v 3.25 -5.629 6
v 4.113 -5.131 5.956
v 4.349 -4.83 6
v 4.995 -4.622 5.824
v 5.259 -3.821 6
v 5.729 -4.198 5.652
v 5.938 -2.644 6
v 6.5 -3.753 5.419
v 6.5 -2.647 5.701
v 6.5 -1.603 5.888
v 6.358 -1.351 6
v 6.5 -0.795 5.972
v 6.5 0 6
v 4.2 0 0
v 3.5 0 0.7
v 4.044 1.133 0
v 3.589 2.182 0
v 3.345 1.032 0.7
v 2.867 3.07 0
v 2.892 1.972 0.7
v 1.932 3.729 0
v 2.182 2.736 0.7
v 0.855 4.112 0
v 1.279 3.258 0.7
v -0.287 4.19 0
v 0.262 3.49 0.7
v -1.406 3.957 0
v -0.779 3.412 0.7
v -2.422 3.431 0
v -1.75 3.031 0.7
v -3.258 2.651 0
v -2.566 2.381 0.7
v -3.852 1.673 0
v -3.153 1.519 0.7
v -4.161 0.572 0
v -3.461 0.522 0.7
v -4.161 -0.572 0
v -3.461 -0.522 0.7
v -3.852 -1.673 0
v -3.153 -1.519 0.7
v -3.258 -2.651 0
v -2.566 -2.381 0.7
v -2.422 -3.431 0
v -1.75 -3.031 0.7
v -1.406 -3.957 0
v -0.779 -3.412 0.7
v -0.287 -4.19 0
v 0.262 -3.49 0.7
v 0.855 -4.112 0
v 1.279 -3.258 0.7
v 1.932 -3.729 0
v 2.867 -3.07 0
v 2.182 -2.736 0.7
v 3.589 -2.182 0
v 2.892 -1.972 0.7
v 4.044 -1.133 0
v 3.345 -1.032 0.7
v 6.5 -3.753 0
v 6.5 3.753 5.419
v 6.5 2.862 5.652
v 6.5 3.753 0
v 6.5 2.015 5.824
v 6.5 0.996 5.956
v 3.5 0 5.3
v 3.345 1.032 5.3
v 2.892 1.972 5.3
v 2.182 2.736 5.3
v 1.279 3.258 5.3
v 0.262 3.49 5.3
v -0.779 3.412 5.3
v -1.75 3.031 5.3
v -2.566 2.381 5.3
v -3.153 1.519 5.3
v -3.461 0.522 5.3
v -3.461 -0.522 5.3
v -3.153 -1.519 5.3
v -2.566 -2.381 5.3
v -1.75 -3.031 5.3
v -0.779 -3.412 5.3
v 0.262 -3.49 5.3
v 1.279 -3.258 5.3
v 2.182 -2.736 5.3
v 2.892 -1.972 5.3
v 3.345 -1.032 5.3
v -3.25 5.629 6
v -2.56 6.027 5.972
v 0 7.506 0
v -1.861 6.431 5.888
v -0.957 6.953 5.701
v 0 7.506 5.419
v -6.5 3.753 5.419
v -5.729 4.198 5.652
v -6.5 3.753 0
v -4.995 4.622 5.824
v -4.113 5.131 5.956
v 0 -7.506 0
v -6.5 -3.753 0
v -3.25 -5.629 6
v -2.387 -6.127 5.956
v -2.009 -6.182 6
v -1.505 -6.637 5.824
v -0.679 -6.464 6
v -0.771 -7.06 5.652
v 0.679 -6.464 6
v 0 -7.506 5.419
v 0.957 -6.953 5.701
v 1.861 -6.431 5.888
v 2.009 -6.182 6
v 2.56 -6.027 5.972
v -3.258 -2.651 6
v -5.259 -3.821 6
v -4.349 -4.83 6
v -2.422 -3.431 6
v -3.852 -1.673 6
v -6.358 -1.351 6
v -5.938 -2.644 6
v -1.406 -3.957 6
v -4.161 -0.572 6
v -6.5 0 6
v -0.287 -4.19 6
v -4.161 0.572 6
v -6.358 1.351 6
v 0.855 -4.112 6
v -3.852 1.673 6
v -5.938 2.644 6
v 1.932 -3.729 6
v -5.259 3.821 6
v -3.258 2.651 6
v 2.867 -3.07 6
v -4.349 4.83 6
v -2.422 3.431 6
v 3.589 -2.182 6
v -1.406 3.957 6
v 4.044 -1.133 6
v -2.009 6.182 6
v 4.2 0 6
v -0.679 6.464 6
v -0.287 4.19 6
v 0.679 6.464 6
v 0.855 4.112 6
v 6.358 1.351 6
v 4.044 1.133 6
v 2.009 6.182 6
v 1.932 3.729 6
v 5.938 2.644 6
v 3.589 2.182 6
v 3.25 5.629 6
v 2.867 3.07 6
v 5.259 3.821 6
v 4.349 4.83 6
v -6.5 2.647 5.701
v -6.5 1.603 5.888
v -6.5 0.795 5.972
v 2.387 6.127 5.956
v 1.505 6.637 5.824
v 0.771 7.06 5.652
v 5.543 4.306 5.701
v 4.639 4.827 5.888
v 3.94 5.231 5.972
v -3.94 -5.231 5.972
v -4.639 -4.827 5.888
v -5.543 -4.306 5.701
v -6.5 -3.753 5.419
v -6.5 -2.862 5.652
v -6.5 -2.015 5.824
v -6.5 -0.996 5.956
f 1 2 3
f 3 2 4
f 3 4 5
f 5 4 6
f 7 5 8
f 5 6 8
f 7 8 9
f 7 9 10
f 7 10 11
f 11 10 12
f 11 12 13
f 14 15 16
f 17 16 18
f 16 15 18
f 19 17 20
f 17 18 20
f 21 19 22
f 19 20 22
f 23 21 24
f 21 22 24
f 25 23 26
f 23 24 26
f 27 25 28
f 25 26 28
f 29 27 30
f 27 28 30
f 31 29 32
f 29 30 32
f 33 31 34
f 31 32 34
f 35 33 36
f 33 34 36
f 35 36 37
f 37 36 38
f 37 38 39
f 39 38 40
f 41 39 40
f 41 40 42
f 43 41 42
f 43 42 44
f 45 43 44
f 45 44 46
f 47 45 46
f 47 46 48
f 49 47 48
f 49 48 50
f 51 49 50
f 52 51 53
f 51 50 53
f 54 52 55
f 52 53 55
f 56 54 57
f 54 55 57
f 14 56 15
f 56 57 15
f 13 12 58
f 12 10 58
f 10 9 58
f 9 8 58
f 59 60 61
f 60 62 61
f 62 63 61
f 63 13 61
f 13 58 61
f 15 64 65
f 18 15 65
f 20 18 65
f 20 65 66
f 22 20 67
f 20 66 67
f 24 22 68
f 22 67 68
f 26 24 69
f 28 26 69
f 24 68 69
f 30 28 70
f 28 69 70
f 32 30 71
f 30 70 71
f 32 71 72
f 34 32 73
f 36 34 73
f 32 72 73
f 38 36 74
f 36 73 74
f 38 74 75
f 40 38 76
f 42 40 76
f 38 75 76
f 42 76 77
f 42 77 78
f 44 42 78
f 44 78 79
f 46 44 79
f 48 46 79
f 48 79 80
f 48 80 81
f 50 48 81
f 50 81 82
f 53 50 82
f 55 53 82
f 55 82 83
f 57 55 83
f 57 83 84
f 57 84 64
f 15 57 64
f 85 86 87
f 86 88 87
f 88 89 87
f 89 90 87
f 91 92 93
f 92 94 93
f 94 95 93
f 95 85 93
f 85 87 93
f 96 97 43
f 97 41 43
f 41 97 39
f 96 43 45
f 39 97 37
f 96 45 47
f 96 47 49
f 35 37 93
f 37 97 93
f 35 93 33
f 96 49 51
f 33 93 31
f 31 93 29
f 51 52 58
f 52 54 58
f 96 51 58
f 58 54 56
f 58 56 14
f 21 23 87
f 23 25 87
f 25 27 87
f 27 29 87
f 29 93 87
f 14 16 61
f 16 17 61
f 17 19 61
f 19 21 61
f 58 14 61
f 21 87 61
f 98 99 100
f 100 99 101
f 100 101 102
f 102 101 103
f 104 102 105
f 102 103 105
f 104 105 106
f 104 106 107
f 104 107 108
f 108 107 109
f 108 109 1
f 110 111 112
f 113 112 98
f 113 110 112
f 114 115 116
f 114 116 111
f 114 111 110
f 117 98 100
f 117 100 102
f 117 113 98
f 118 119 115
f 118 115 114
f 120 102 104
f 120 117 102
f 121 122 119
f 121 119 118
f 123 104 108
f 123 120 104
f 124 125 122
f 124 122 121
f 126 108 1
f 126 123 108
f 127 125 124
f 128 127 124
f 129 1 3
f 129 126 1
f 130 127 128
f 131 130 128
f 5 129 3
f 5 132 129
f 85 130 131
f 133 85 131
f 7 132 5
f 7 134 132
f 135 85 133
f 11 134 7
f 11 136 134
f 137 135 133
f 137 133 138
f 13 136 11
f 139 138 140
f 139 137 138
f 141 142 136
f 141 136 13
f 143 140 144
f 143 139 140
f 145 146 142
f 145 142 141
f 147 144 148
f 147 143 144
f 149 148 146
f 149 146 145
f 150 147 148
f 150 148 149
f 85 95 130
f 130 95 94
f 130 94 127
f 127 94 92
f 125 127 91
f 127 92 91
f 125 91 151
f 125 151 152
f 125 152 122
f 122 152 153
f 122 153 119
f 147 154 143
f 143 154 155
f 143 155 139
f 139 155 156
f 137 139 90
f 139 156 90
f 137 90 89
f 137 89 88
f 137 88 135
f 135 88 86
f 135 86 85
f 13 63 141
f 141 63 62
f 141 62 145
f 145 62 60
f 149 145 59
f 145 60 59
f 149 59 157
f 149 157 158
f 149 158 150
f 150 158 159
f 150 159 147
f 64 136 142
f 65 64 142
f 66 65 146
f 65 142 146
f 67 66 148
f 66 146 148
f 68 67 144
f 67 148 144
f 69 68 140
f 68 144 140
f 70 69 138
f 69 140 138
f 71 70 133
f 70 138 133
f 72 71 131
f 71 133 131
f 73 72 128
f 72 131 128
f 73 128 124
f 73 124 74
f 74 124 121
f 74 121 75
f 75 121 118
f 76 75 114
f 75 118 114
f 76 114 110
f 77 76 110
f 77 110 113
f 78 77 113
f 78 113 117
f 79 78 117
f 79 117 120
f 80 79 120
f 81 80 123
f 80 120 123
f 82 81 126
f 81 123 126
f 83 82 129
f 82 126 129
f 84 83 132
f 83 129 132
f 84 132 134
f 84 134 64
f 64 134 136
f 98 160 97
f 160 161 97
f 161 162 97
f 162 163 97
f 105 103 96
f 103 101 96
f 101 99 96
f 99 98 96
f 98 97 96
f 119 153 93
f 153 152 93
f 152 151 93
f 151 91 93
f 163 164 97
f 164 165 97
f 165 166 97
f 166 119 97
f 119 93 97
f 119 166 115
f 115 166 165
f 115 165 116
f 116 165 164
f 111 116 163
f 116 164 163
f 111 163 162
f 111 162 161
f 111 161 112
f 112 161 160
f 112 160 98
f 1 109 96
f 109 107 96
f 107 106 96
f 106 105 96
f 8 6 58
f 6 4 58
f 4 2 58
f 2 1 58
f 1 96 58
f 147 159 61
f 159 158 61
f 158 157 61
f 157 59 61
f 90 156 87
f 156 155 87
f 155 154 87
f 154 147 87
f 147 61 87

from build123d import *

# Parameters (mm, degrees)
F1_DEPTH = 6
F2_R     = 3.5
F3_DEPTH = 6.001
F6_SIZE  = 0.7


with BuildPart() as f1:
    # F0 (on Top) → F1 (new body)
    with BuildSketch(Plane.XY):
        Polygon((6.5, -3.752777), (6.5, 3.752777), (0, 7.505553), (-6.5, 3.752777), (-6.5, -3.752777), (0, -7.505553), align=None)
    extrude(amount=F1_DEPTH)

    # F2 (on face) → F3 (cut, through all)
    with BuildSketch(Plane.XY.offset(6)):
        Circle(F2_R)
    extrude(amount=-F3_DEPTH, mode=Mode.SUBTRACT)

    # F4 (on Front) → F5 (revolve, cut)
    with BuildSketch(Plane.XZ):
        Polygon((10.708706, 6), (6.5, 6), (10.708706, 3.570103), align=None)
    revolve(axis=Axis((0, 0, 2.326309), (0, 0, 1)), mode=Mode.SUBTRACT)

    # F6
    f6_edges = [f1.edges().sort_by_distance(p)[0] for p in [
        (-3.5, 0, 6),
        (-3.5, 0, 0),
    ]]
    chamfer(f6_edges, length=F6_SIZE)


solid = f1.part
